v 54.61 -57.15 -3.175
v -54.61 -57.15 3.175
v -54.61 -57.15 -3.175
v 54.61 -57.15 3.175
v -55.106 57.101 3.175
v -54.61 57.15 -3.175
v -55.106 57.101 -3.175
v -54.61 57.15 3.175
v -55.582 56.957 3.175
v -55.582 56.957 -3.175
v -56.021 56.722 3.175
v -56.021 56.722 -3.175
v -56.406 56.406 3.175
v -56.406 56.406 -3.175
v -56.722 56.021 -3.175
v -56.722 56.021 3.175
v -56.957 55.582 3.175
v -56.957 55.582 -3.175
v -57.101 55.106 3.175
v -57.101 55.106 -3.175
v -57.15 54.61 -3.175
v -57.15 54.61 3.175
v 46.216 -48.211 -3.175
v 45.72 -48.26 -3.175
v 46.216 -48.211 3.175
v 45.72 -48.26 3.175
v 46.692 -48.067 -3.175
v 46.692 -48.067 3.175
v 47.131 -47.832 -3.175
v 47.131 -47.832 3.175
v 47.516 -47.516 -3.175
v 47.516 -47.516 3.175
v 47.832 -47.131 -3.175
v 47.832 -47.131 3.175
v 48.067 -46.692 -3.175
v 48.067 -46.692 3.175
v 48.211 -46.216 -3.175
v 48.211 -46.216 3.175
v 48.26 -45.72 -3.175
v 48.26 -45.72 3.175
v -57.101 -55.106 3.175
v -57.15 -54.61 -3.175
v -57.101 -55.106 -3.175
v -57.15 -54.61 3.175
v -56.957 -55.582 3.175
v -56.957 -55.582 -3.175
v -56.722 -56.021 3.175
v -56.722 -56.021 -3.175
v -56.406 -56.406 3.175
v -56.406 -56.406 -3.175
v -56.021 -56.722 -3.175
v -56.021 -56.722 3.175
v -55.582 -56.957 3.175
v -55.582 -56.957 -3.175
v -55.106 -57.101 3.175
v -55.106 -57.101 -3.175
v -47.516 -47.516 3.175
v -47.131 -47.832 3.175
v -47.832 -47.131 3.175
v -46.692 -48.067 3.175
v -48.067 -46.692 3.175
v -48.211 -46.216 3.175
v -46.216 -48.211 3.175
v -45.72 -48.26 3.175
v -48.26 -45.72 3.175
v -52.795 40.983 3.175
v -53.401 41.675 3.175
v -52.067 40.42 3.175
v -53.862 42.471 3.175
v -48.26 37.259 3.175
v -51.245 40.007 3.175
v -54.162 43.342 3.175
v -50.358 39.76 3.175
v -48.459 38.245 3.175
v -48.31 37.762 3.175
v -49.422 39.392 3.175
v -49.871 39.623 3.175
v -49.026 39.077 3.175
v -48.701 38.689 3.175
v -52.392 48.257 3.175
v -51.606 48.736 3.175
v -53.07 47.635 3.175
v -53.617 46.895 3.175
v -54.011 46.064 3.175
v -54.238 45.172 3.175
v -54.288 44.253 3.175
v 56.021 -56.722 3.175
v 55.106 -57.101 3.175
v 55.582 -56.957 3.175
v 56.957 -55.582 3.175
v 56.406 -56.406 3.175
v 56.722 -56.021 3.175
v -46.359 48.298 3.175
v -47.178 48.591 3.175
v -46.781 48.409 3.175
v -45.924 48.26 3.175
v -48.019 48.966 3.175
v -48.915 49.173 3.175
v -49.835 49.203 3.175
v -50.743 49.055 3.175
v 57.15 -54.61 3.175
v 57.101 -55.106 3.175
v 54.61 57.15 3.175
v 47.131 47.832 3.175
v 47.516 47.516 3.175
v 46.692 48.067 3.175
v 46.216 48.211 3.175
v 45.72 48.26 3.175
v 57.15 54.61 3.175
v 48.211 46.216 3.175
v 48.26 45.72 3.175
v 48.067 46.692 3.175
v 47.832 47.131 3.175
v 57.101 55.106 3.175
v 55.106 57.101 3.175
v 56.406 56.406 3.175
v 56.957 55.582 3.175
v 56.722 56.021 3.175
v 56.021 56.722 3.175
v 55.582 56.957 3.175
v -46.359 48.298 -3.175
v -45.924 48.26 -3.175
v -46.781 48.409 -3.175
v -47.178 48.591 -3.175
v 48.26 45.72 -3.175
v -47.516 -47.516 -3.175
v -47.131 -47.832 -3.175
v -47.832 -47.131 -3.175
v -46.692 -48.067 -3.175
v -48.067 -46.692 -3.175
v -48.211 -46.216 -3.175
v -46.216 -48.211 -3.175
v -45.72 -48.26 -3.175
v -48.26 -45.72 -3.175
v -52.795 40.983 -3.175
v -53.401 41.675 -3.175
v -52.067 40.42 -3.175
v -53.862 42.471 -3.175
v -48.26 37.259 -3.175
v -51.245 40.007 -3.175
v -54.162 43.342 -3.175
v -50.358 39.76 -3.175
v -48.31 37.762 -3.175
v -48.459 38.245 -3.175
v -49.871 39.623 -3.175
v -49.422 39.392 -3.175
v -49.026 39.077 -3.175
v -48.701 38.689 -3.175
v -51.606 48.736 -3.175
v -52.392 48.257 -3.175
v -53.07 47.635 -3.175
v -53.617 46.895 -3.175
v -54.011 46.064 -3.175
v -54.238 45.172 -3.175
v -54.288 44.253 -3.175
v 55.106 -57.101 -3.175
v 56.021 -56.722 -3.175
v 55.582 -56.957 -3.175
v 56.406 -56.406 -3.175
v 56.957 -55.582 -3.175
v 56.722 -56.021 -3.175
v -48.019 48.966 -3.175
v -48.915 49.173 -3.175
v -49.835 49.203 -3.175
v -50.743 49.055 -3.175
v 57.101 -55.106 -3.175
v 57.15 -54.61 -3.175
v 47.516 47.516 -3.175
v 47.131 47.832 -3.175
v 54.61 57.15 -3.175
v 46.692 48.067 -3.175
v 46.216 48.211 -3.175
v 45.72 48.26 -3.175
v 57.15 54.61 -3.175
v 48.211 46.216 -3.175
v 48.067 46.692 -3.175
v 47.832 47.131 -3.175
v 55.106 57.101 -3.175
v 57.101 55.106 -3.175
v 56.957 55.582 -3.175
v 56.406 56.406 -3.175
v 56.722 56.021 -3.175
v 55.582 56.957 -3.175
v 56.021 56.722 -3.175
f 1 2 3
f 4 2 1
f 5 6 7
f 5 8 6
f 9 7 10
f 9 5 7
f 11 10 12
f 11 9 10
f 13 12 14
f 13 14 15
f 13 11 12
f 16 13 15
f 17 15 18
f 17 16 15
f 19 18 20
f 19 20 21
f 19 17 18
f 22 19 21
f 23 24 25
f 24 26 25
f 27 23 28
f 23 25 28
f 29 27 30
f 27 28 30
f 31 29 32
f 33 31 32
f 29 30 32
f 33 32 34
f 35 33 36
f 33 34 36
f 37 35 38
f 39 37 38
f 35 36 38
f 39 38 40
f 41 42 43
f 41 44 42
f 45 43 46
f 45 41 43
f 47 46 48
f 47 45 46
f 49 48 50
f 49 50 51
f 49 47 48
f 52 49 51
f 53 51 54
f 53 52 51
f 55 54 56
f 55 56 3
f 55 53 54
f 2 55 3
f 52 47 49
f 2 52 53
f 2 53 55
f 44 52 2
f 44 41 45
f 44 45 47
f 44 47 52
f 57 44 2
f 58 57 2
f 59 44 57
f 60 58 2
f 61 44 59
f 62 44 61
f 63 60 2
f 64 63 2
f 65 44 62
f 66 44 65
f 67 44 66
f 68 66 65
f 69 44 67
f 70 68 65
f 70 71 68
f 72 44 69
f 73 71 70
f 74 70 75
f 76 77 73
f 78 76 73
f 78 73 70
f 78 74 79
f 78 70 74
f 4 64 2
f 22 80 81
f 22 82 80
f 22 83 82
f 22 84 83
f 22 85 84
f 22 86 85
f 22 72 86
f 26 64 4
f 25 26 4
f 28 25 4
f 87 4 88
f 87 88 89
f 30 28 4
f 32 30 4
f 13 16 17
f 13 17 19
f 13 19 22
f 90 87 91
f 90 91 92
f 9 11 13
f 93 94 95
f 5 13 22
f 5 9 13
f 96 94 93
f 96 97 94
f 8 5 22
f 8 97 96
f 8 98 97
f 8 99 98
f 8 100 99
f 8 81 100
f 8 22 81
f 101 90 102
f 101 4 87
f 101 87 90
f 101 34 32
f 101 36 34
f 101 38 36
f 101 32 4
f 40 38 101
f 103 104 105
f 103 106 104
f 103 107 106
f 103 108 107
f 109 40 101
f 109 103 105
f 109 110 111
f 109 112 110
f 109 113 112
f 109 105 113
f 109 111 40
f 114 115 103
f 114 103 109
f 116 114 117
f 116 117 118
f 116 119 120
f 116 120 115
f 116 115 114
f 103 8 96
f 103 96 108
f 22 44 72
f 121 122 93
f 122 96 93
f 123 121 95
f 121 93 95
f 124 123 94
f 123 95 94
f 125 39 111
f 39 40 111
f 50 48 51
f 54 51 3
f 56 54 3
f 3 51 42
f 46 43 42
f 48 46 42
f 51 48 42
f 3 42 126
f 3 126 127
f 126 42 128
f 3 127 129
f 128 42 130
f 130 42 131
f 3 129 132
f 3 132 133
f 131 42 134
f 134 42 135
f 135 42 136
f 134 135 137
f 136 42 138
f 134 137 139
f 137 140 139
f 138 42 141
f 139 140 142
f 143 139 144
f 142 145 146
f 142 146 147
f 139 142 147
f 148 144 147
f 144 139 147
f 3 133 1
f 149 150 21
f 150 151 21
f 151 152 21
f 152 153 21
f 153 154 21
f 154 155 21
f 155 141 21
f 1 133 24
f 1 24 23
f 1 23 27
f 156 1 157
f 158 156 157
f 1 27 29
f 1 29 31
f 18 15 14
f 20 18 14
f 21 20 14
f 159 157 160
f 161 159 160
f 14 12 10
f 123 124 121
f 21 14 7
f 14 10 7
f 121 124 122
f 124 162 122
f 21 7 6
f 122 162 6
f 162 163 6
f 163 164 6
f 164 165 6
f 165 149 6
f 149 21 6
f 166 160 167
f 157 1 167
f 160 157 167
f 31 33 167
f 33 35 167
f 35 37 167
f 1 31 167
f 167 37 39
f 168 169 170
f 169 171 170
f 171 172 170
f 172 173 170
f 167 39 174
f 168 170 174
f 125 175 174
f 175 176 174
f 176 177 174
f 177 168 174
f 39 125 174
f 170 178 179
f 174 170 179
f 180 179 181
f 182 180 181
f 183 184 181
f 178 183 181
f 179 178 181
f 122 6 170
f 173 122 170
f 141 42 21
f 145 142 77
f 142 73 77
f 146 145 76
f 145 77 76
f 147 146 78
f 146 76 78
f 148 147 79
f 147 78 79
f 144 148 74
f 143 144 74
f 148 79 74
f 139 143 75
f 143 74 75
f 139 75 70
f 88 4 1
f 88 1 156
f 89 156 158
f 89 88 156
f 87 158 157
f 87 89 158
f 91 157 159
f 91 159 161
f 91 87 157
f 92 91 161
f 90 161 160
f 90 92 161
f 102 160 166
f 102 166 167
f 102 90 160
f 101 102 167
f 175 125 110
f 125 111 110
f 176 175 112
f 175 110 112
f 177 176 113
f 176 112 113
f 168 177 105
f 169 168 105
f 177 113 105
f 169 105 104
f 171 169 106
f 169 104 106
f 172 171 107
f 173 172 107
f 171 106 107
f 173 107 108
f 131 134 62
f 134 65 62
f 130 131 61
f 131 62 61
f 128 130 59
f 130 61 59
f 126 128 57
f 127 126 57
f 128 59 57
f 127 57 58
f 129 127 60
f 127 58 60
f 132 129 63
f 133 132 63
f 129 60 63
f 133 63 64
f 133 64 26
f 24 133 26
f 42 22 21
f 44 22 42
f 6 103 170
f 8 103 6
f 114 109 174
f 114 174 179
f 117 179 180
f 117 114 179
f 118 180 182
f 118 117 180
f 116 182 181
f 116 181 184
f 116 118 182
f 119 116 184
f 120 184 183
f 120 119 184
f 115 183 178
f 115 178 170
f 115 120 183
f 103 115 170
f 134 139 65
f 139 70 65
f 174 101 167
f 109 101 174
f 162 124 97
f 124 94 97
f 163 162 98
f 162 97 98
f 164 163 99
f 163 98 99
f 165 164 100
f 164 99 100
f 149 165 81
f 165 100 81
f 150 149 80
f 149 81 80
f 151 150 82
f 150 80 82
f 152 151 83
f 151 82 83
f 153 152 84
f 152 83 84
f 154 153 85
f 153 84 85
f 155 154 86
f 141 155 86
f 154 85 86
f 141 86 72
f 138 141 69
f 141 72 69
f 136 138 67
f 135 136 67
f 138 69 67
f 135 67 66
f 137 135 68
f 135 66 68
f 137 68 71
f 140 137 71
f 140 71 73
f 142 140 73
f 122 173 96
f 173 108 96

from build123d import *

# Parameters (mm, degrees)
BOSS_EXTRUDE1_DEPTH = 3.175


with BuildPart() as part:
    # Sketch1 → Boss-Extrude1 (new, symmetric)
    with BuildSketch(Plane.XY):
        with BuildLine():
            Line((-54.61, -57.15), (54.61, -57.15))
            ThreePointArc((54.61, -57.15), (56.406051224, -56.406051224), (57.15, -54.61))
            Line((57.15, -54.61), (57.15, 54.61))
            ThreePointArc((57.15, 54.61), (56.406051224, 56.406051224), (54.61, 57.15))
            Line((54.61, 57.15), (-54.61, 57.15))
            ThreePointArc((-54.61, 57.15), (-56.406051224, 56.406051224), (-57.15, 54.61))
            Line((-57.15, 54.61), (-57.15, -54.61))
            ThreePointArc((-57.15, -54.61), (-56.406051224, -56.406051224), (-54.61, -57.15))
        make_face()
        with BuildLine():
            Line((-45.72, -48.26), (11.649731947, -48.26))
            Line((11.649731947, -48.26), (45.72, -48.26))
            ThreePointArc((45.72, -48.26), (47.516051224, -47.516051224), (48.26, -45.72))
            Line((48.26, -45.72), (48.26, -17.513600374))
            Line((48.26, -17.513600374), (48.26, 45.72))
            ThreePointArc((48.26, 45.72), (47.516051224, 47.516051224), (45.72, 48.26))
            Line((45.72, 48.26), (12.317525133, 48.26))
            Line((12.317525133, 48.26), (-45.9238932, 48.26))
            ThreePointArc((-45.9238932, 48.26), (-46.572550677, 48.344222429), (-47.178191218, 48.591304348))
            ThreePointArc((-47.178191218, 48.591304348), (-54.010842502, 46.063523076), (-50.35826087, 39.760075674))
            ThreePointArc((-50.35826087, 39.760075674), (-48.854027571, 38.891201551), (-48.26, 37.2587827))
            Line((-48.26, 37.2587827), (-48.26, -0.752095073))
            Line((-48.26, -0.752095073), (-48.26, -45.72))
            ThreePointArc((-48.26, -45.72), (-47.516051224, -47.516051224), (-45.72, -48.26))
        make_face(mode=Mode.SUBTRACT)
    extrude(amount=BOSS_EXTRUDE1_DEPTH, both=True)


solid = part.part
